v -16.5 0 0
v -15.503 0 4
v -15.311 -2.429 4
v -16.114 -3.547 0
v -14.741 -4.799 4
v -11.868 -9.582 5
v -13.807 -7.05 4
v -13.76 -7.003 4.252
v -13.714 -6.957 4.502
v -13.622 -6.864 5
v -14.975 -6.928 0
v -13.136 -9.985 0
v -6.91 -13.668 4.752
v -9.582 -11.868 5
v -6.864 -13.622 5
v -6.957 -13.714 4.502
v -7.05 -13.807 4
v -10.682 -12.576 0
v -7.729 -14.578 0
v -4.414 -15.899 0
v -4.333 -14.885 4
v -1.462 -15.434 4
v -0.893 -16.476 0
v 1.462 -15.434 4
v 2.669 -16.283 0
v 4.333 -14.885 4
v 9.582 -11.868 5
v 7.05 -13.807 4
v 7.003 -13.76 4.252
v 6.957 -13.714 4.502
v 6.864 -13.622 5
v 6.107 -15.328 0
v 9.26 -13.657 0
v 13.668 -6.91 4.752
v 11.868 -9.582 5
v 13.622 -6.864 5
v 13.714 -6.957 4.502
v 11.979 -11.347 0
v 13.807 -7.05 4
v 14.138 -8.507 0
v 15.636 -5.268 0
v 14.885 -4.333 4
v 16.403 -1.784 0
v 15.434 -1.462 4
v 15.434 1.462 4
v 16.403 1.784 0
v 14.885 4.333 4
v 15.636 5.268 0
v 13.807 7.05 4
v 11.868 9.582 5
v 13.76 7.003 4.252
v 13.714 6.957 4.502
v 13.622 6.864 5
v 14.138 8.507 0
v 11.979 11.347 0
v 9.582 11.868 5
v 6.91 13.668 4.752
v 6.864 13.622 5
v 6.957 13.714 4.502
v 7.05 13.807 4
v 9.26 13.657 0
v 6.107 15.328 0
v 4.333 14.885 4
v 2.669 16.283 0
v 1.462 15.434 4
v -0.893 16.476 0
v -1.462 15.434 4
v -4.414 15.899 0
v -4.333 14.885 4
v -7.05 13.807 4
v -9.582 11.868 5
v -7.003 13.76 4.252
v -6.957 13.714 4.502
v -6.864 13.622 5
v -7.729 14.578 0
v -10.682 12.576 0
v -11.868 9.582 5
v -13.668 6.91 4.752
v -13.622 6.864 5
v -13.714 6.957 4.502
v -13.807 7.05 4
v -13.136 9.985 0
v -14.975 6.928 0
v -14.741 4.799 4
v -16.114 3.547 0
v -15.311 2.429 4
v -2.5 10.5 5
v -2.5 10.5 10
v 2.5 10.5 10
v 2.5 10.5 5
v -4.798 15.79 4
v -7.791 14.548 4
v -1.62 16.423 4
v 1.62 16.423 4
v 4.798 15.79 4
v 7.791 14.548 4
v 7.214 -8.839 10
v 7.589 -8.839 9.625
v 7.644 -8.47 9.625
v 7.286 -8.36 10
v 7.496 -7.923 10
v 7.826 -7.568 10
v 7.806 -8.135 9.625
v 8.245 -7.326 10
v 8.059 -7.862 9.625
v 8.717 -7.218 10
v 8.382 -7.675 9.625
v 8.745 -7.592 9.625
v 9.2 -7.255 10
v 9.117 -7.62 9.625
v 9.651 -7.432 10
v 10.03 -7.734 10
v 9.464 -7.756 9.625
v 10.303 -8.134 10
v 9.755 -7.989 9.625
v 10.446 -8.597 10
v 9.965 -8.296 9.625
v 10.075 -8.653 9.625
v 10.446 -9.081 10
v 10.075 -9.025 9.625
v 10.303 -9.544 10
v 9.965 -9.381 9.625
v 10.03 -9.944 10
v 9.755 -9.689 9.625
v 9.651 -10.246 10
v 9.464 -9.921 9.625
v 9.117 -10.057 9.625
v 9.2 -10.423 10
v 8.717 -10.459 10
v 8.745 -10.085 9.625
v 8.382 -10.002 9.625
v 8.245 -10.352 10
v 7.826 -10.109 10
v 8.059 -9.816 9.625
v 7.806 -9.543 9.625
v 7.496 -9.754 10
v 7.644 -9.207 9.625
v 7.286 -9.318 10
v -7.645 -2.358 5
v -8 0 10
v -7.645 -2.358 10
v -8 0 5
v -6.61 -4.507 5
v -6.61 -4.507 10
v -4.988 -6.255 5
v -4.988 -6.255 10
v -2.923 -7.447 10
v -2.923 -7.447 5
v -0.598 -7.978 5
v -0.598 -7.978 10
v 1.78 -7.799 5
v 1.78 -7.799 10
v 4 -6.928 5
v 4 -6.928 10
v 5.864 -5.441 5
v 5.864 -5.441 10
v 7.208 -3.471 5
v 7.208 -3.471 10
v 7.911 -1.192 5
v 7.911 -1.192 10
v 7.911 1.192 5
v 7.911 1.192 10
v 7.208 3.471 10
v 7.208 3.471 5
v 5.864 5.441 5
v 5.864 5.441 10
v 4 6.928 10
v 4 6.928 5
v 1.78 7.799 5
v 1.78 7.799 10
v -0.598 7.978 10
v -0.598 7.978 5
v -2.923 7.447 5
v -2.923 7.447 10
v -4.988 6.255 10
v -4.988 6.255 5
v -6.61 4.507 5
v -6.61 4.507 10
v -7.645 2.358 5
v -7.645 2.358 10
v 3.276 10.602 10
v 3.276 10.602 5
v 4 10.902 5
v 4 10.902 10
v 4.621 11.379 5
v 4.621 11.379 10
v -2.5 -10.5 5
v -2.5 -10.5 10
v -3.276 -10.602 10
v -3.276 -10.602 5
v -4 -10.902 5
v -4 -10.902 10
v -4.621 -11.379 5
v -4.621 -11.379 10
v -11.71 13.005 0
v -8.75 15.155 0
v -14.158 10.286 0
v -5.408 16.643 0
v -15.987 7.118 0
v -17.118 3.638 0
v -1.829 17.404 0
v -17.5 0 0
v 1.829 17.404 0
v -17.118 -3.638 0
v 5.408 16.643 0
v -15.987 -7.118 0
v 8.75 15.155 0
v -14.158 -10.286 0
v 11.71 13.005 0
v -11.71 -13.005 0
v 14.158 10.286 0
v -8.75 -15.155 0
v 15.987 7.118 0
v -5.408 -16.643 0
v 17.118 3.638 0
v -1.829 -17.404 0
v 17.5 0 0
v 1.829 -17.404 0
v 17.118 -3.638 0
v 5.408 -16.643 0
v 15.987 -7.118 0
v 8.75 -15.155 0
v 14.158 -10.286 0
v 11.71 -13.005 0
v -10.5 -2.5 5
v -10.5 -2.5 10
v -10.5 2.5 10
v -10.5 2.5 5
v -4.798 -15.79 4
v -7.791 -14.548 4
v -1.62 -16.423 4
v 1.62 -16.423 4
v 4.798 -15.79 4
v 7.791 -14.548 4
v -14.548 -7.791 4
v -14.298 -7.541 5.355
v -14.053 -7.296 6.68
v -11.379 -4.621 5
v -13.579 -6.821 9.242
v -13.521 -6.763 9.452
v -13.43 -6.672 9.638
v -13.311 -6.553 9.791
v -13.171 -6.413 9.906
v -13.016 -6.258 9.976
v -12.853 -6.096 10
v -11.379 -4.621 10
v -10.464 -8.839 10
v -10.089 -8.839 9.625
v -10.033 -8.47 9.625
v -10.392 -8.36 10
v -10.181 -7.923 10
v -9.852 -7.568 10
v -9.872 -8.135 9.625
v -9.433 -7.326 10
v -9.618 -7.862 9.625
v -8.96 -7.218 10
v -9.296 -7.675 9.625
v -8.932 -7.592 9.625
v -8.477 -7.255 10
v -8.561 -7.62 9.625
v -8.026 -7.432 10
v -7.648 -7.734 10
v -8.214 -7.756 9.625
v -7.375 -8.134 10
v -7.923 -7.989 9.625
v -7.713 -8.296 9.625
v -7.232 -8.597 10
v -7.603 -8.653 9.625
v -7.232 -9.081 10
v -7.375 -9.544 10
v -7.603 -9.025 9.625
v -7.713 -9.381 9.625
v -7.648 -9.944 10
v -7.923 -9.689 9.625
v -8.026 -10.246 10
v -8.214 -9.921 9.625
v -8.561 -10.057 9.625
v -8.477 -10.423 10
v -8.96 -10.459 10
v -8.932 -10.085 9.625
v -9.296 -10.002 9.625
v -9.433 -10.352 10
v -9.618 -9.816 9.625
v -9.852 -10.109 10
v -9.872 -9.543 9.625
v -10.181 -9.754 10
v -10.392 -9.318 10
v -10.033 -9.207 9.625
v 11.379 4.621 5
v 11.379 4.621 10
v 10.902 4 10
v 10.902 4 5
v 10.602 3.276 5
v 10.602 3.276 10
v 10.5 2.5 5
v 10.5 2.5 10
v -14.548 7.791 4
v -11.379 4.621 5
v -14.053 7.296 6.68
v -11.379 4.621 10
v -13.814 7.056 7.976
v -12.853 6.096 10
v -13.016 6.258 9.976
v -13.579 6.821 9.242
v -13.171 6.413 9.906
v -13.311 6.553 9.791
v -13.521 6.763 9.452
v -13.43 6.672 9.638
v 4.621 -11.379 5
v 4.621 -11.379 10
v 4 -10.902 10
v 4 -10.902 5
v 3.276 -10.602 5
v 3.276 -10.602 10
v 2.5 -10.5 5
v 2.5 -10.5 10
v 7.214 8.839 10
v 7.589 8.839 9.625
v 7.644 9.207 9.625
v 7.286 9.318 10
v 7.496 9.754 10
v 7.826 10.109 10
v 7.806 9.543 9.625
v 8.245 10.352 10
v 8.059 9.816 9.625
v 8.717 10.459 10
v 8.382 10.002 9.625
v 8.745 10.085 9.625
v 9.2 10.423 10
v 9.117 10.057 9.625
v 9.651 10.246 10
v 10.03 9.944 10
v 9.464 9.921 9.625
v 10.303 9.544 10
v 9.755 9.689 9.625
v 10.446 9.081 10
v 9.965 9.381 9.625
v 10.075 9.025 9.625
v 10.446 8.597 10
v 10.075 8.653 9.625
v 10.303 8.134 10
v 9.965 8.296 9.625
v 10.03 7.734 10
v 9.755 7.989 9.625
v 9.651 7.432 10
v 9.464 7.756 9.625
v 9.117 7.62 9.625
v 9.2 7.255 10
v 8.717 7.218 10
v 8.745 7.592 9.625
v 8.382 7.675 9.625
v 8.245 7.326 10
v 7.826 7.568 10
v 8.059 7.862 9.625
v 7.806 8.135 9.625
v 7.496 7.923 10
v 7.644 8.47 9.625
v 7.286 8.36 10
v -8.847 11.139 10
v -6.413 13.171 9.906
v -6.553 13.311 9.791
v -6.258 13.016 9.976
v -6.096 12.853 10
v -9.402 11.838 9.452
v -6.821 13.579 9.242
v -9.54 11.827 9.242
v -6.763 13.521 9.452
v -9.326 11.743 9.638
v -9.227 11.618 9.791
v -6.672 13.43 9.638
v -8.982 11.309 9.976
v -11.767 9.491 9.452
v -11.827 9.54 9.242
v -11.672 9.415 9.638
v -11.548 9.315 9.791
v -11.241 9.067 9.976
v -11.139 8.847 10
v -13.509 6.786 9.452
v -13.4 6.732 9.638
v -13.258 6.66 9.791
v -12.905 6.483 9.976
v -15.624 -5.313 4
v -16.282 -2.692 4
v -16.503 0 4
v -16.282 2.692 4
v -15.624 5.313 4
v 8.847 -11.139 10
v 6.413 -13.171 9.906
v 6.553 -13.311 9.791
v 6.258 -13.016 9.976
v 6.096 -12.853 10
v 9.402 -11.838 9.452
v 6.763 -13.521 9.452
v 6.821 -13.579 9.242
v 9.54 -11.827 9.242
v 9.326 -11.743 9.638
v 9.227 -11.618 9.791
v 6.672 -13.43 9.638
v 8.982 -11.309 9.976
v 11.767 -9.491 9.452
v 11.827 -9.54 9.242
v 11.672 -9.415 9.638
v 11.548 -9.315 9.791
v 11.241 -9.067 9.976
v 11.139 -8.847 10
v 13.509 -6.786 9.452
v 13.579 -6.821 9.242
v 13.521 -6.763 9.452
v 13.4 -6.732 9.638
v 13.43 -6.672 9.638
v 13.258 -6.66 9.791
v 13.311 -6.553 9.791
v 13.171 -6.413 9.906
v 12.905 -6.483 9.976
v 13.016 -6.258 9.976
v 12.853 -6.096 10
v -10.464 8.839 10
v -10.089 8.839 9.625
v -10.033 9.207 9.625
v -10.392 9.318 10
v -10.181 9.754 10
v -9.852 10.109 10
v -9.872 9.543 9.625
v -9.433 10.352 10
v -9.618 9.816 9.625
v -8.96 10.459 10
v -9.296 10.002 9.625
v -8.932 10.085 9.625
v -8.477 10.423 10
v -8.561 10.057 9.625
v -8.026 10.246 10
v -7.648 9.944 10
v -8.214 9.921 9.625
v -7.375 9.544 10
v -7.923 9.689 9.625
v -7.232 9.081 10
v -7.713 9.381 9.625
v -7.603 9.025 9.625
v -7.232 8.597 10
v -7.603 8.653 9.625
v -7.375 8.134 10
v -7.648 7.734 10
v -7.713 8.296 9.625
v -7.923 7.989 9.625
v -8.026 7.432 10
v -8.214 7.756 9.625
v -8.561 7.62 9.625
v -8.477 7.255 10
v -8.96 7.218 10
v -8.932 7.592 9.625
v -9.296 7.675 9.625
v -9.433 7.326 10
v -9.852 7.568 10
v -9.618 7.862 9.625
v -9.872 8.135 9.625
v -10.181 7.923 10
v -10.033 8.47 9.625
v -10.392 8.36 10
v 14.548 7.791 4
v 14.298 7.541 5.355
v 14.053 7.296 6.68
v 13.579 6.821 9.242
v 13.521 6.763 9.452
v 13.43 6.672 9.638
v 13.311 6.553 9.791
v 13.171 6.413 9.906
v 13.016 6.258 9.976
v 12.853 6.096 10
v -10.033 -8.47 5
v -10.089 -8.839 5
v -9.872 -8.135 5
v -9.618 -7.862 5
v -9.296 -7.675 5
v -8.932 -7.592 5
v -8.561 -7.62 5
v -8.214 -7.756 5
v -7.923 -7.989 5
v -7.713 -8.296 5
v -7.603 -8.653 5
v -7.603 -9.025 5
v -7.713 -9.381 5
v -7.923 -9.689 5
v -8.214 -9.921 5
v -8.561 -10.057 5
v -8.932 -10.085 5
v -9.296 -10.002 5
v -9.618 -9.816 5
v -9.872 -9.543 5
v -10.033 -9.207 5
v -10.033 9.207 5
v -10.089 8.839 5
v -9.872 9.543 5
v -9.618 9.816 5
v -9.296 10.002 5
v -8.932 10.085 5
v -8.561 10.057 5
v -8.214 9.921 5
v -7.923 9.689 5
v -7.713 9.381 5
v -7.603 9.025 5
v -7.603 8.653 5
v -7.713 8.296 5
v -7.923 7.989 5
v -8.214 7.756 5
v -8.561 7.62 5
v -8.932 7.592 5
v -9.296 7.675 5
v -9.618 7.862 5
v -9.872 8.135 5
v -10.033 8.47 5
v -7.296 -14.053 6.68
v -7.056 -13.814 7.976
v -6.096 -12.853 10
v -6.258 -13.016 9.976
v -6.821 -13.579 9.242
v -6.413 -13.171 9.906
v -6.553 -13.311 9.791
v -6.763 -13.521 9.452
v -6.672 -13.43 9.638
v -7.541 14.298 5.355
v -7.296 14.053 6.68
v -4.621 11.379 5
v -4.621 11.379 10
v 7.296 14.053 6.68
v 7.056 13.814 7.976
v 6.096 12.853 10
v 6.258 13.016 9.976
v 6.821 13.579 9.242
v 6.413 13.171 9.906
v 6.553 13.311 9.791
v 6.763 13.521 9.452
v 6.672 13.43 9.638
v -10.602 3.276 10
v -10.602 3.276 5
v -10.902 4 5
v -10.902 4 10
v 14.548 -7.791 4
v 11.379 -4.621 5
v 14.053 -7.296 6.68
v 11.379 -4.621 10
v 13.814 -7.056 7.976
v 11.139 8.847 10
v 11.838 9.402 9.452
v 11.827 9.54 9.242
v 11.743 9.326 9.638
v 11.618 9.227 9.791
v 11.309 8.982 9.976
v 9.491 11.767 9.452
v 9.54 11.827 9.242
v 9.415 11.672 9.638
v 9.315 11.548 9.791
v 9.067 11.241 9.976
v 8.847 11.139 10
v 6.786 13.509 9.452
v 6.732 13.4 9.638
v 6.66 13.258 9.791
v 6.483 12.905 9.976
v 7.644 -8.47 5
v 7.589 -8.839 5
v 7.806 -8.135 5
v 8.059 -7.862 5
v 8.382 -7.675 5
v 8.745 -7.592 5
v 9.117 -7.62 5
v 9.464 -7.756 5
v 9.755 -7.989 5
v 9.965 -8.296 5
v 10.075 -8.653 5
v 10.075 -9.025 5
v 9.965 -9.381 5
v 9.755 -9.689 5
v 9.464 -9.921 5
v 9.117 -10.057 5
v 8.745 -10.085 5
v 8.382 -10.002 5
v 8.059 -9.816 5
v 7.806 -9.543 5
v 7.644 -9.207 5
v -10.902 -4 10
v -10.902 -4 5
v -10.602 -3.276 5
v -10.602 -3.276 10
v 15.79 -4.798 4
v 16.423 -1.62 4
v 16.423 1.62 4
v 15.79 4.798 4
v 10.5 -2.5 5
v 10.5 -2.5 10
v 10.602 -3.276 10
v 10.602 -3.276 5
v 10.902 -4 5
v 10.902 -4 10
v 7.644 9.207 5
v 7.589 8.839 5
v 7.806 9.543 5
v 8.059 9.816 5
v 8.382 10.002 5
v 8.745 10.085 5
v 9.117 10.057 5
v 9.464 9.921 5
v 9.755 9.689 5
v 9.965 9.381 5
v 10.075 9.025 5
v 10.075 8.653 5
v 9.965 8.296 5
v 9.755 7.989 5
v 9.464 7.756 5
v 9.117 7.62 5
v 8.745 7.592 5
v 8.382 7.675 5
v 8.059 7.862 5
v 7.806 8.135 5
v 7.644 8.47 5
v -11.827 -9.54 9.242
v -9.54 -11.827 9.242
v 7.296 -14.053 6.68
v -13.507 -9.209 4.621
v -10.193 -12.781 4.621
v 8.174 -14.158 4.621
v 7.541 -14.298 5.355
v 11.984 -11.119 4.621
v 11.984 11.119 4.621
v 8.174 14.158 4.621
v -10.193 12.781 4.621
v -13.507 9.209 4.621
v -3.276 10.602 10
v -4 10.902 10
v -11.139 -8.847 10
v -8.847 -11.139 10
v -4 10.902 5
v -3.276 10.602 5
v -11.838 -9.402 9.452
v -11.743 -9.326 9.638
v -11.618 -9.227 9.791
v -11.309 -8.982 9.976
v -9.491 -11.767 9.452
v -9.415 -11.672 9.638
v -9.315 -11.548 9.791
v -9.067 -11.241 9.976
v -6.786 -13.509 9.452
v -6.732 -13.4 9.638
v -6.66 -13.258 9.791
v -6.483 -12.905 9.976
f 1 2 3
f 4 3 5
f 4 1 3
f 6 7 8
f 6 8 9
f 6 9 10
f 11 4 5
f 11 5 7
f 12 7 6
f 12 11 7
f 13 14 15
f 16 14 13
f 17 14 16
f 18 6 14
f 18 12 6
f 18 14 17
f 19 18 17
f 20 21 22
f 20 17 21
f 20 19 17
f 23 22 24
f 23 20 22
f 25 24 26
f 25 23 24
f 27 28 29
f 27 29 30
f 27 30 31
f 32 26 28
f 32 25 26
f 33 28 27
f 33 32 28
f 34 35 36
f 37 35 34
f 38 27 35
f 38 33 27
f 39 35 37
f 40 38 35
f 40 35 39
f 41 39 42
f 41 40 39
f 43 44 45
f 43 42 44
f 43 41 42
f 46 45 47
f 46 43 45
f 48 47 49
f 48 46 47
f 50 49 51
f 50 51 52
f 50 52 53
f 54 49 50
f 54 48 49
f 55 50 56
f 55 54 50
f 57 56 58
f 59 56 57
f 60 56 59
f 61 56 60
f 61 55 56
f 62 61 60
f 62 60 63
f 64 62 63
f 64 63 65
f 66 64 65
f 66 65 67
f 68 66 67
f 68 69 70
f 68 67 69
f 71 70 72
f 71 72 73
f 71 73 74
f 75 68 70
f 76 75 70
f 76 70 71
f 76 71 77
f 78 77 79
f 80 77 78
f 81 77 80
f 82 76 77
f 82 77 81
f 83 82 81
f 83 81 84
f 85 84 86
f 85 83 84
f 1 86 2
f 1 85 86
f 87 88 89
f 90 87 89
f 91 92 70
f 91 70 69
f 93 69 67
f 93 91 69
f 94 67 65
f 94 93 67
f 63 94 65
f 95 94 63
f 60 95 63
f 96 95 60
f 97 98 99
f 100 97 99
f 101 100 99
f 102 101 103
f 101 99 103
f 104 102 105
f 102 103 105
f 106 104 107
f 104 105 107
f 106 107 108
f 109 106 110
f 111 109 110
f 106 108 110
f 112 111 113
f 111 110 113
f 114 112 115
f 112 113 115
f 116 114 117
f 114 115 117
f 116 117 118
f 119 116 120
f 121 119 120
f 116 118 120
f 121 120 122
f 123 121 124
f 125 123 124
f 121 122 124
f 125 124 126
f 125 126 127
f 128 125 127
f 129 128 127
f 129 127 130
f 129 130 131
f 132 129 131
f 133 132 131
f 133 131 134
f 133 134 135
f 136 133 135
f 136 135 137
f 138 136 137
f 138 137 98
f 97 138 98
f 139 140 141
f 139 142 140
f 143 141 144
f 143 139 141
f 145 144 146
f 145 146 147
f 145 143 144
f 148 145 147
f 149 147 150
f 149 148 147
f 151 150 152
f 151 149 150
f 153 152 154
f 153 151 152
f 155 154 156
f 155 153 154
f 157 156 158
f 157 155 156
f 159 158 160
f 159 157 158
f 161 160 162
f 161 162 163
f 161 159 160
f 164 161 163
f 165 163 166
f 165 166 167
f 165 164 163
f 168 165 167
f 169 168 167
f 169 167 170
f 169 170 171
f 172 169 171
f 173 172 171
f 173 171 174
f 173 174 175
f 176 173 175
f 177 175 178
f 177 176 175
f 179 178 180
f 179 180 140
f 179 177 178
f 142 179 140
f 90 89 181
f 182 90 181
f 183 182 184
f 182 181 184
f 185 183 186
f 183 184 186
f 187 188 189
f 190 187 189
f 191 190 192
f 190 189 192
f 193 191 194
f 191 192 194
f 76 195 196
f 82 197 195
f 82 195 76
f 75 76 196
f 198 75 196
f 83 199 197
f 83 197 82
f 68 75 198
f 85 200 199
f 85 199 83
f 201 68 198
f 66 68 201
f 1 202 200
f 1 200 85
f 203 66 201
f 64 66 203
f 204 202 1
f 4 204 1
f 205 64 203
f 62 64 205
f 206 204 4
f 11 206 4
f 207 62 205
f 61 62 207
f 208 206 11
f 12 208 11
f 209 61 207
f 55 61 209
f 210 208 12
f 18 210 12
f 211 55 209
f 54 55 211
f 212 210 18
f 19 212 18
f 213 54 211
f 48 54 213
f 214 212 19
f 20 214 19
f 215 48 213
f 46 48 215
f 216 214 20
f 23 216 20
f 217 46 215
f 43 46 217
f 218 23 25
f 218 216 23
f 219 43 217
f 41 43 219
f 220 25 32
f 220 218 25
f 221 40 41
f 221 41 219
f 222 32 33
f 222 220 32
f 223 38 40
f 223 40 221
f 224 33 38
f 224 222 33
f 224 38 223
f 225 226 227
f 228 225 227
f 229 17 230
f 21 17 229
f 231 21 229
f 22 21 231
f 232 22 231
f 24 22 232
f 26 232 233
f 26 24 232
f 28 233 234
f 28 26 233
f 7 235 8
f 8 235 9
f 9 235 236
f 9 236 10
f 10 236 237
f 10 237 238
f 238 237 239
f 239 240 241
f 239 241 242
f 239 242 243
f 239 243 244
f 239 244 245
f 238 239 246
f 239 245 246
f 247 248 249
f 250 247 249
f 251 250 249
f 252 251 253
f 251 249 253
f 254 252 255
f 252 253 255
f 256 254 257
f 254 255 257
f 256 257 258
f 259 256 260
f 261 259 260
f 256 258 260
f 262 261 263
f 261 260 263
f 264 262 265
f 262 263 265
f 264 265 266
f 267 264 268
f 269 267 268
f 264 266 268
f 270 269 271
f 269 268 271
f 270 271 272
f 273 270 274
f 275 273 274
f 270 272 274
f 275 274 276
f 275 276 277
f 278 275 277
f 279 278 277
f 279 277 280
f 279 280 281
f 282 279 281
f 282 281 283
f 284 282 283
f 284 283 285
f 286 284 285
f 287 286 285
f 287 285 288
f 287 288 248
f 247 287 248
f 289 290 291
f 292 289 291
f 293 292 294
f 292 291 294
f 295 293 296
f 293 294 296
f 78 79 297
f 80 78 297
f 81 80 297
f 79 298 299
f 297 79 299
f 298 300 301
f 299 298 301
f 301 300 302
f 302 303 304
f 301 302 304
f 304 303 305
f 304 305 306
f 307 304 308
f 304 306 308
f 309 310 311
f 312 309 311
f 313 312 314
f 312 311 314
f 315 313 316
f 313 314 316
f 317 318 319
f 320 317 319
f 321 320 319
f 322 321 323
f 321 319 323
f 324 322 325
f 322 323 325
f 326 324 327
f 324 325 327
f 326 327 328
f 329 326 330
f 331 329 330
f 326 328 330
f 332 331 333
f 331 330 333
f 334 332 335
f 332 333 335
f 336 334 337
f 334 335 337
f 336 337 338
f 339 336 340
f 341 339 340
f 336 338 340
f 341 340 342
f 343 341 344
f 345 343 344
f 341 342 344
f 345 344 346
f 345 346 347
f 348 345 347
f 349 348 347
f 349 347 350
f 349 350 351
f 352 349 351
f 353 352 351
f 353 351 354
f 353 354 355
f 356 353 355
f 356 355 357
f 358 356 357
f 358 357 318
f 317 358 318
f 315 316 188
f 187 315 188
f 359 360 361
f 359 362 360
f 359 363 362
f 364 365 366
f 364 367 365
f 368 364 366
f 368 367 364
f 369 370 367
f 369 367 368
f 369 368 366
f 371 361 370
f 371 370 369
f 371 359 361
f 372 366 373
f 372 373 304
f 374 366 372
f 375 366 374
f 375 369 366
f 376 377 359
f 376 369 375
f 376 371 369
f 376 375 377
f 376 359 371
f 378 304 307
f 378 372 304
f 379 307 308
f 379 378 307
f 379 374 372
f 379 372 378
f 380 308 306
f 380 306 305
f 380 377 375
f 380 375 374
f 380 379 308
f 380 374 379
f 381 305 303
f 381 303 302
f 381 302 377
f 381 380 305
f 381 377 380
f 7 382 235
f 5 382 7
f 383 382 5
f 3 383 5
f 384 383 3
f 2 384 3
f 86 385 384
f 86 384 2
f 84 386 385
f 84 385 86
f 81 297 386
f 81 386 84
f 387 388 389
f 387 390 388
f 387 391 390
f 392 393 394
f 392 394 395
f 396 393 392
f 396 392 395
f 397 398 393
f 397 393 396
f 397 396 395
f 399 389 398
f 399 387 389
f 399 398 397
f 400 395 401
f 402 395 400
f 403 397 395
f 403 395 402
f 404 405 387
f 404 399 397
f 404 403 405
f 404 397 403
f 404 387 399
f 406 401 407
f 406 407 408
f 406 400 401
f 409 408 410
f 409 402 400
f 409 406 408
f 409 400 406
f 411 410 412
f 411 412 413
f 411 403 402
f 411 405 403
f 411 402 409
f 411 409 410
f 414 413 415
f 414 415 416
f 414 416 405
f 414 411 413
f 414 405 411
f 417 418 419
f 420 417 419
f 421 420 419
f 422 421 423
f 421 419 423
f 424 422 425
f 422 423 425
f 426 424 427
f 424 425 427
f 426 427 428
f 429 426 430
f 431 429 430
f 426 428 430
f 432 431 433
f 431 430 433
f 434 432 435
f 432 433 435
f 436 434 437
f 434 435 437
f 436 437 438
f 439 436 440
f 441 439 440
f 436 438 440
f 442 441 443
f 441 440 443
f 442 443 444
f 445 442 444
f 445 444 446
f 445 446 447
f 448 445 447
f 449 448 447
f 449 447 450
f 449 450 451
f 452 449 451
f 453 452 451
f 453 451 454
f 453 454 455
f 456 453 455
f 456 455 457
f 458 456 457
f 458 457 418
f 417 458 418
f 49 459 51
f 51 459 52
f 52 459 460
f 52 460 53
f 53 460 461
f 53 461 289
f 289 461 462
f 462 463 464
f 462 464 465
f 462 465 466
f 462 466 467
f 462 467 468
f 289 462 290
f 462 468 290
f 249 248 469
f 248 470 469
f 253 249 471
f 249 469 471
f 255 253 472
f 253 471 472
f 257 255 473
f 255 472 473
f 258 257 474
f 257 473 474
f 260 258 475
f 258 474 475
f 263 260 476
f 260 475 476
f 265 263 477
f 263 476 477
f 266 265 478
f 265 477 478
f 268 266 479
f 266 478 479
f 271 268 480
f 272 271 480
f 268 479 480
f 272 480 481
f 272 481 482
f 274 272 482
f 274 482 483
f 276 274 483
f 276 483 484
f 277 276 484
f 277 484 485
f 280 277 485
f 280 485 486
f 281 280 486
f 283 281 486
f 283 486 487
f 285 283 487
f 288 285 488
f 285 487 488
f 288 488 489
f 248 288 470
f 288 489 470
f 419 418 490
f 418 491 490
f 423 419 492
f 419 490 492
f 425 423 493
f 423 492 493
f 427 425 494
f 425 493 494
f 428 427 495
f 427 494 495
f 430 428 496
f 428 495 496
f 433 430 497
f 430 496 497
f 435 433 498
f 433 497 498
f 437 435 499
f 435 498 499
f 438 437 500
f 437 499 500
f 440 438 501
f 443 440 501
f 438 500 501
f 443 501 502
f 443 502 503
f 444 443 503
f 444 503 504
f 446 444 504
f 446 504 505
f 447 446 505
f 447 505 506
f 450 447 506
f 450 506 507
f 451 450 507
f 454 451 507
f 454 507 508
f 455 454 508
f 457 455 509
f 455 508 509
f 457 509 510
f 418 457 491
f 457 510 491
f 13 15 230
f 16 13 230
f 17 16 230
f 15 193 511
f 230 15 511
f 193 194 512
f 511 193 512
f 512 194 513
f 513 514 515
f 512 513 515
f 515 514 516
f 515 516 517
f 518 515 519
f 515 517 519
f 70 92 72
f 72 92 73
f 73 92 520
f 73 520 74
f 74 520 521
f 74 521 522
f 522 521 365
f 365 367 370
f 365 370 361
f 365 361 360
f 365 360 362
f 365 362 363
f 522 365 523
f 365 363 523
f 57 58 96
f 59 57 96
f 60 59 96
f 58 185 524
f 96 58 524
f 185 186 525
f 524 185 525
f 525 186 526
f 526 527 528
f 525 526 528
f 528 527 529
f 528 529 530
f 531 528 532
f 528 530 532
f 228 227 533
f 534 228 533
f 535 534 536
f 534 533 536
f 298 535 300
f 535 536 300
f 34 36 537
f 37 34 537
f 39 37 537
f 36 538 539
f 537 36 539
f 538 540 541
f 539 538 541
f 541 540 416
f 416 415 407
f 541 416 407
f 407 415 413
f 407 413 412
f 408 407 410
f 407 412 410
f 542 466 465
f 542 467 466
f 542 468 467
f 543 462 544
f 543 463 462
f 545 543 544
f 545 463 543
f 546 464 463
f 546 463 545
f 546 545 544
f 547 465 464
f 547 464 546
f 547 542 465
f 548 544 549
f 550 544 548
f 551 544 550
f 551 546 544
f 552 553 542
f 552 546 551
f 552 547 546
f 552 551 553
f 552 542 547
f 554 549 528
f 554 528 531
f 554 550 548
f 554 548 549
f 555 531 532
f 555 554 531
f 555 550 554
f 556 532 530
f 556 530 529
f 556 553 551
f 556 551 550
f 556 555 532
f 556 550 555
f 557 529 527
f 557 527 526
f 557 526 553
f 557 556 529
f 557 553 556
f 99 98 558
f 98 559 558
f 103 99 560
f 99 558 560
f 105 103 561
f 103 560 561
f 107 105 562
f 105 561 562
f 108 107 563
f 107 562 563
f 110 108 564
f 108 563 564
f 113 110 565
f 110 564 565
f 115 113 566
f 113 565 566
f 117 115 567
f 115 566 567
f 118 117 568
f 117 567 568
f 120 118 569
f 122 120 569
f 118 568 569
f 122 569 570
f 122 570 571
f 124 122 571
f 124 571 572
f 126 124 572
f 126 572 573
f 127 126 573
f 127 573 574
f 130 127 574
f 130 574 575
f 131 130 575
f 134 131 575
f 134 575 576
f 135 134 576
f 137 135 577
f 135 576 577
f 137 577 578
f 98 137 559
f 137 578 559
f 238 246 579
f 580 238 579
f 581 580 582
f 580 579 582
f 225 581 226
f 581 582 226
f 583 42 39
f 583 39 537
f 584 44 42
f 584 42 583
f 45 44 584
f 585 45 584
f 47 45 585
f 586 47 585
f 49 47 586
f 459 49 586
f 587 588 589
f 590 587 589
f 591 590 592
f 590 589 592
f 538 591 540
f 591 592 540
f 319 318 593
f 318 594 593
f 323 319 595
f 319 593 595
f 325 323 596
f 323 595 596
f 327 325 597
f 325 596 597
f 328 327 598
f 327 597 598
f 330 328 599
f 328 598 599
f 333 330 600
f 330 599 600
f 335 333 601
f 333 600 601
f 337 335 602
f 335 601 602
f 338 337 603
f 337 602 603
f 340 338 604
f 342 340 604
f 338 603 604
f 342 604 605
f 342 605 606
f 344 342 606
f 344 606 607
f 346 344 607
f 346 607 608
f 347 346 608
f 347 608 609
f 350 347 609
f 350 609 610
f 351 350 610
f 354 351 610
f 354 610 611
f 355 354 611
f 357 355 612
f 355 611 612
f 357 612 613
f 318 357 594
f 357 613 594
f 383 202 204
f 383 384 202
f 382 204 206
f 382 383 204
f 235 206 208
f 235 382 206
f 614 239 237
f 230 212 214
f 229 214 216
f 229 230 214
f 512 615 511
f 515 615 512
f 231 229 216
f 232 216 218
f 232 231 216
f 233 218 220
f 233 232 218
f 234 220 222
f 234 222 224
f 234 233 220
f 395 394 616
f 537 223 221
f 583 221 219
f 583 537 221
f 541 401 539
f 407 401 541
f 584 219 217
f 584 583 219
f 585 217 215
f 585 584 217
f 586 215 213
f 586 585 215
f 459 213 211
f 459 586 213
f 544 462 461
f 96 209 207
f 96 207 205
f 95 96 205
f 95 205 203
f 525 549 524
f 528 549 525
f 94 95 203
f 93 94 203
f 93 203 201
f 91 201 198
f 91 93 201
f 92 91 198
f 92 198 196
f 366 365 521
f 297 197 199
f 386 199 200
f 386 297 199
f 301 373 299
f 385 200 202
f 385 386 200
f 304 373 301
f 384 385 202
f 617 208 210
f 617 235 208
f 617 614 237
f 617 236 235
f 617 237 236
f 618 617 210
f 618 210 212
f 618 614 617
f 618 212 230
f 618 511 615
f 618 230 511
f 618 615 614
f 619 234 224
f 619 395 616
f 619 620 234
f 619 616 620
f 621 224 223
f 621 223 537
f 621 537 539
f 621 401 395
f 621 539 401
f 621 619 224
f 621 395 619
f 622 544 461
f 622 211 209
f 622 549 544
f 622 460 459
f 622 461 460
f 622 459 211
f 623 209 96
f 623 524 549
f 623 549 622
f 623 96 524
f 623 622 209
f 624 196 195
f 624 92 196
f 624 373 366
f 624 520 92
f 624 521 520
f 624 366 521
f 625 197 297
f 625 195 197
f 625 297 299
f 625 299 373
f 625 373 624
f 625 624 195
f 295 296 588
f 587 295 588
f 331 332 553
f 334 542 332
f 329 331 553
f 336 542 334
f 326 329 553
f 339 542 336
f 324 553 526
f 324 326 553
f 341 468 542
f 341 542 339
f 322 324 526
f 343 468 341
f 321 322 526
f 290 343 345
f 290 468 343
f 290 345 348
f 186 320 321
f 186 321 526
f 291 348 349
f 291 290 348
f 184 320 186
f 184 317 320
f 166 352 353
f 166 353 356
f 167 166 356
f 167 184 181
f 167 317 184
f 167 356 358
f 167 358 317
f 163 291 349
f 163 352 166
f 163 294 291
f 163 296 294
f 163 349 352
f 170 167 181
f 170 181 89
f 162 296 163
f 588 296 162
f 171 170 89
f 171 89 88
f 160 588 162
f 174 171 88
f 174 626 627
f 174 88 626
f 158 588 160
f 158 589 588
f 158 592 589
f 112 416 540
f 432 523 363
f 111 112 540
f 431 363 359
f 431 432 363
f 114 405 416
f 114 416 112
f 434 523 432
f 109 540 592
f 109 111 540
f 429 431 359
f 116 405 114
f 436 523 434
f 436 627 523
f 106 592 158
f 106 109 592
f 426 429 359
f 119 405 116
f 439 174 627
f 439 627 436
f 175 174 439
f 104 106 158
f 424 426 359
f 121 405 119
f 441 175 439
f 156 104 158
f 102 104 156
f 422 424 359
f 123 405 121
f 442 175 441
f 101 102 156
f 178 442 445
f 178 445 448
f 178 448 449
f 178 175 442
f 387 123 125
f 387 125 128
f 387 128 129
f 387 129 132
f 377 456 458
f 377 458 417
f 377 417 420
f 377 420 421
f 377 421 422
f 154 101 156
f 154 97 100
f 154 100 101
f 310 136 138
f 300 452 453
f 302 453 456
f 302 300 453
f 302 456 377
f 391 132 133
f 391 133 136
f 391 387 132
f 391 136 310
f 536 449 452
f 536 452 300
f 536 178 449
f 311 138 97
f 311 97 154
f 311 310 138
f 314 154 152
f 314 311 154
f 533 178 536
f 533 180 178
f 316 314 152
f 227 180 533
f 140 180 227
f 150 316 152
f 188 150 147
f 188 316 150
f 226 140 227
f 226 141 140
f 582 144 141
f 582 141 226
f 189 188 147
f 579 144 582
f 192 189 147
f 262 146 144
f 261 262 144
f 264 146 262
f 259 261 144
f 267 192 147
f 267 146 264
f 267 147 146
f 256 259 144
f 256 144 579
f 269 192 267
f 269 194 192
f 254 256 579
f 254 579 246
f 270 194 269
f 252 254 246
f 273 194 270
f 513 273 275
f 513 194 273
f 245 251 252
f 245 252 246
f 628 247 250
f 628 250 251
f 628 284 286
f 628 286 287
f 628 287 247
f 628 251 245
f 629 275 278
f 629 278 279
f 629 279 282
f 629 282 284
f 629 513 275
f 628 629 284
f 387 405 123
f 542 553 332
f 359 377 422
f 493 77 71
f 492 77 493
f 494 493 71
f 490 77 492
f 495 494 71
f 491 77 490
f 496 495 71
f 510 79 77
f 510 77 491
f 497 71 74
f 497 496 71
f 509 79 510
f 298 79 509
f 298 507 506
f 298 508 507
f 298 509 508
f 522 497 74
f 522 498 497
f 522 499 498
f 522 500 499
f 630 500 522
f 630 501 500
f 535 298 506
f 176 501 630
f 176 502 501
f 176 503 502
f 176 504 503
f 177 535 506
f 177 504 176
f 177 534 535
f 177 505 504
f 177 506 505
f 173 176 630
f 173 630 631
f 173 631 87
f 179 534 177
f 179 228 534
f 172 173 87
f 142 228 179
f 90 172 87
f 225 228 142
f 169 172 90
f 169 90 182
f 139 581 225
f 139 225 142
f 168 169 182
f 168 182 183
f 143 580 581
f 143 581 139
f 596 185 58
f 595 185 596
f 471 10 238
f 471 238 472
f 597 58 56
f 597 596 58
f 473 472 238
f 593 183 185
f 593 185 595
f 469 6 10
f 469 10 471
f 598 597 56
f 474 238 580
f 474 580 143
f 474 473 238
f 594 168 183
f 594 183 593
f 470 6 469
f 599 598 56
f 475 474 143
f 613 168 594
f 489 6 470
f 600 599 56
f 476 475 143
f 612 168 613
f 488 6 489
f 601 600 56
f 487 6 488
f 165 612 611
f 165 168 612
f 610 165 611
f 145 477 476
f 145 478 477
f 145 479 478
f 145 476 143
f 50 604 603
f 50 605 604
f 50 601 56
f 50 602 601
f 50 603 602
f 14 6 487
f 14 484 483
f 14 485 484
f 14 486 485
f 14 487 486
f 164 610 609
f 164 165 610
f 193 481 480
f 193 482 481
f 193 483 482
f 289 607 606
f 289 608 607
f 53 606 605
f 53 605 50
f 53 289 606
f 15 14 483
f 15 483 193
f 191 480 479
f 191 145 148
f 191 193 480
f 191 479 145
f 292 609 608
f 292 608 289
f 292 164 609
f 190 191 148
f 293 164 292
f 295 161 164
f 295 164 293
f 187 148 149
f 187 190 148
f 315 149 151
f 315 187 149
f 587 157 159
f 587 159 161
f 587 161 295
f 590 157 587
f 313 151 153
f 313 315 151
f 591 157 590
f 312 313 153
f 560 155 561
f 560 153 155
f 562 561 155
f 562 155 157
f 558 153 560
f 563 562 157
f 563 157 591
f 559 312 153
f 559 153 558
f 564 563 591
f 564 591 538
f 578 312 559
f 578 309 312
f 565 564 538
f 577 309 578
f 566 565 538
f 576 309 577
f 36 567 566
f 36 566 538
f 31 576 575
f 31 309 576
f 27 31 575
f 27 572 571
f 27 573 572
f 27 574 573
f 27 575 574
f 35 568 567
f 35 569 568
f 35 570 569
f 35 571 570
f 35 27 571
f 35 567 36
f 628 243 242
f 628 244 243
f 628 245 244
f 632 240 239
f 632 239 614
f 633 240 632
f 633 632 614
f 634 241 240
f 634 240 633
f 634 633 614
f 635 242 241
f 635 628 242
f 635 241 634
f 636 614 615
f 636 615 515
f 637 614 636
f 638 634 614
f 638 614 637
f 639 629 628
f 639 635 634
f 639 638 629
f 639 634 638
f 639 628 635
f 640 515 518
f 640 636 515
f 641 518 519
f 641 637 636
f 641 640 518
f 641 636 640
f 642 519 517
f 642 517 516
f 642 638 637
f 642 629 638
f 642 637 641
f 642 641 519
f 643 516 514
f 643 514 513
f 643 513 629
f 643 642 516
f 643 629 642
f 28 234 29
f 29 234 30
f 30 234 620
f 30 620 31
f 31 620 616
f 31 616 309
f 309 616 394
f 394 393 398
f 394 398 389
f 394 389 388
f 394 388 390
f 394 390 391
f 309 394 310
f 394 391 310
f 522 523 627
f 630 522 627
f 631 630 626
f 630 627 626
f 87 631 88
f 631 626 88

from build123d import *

# Parameters (mm, degrees)
FILLET1_R                       = 1
M3X0_5_TAPPED_HOLE1_D           = 2.5
M3X0_5_TAPPED_HOLE1_CSINK_D     = 3.25
M3X0_5_TAPPED_HOLE1_CSINK_ANGLE = 90
CUT_EXTRUDE1_DEPTH              = 6


with BuildPart() as part:
    # Sketch4 → Revolve1 (revolve)
    with BuildSketch(Plane(origin=(0, 0, 0), x_dir=(0, 0, -1), z_dir=(1, 0, 0)), mode=Mode.PRIVATE) as revolve1_sk:
        Polygon((0, 16.5), (0, 17.5), (-10, 15.006719972), (-10, 8), (-5, 8), (-5, 15.253359986), align=None)
    revolve(revolve1_sk.sketch.rotate(Axis((0, 0, 0), (0, 0, 1)), 90), axis=Axis((0, 0, 0), (0, 0, 1)))

    # Fillet1
    fillet1_edges = [part.edges().sort_by_distance(p)[0] for p in [
        (15.006719972, 0, 10),
    ]]
    fillet(fillet1_edges, radius=FILLET1_R)

    # M3x0.5 Tapped Hole1 (through all)
    with Locations(Plane.XY.offset(10)):
        with Locations((8.838834765, 8.838834765), (-8.838834765, 8.838834765), (-8.838834765, -8.838834765), (8.838834765, -8.838834765)):
            CounterSinkHole(M3X0_5_TAPPED_HOLE1_D / 2, M3X0_5_TAPPED_HOLE1_CSINK_D / 2, counter_sink_angle=M3X0_5_TAPPED_HOLE1_CSINK_ANGLE)

    # Sketch9 → Cut-Extrude1 (cut)
    with BuildSketch(Plane.XY.offset(10)):
        with BuildLine():
            Line((-13.242640687, 20), (-4.621320344, 11.378679656))
            ThreePointArc((-4.621320344, 11.378679656), (-3.648050297, 10.728361402), (-2.5, 10.5))
            Line((-2.5, 10.5), (2.5, 10.5))
            ThreePointArc((2.5, 10.5), (3.648050297, 10.728361402), (4.621320344, 11.378679656))
            Line((4.621320344, 11.378679656), (13.242640687, 20))
            Line((13.242640687, 20), (-13.242640687, 20))
        make_face()
        with BuildLine():
            Line((20, 13.242640687), (11.378679656, 4.621320344))
            ThreePointArc((11.378679656, 4.621320344), (10.728361402, 3.648050297), (10.5, 2.5))
            Line((10.5, 2.5), (10.5, -2.5))
            ThreePointArc((10.5, -2.5), (10.728361402, -3.648050297), (11.378679656, -4.621320344))
            Line((11.378679656, -4.621320344), (20, -13.242640687))
            Line((20, -13.242640687), (20, 13.242640687))
        make_face()
        with BuildLine():
            Line((13.242640687, -20), (4.621320344, -11.378679656))
            ThreePointArc((4.621320344, -11.378679656), (3.648050297, -10.728361402), (2.5, -10.5))
            Line((2.5, -10.5), (-2.5, -10.5))
            ThreePointArc((-2.5, -10.5), (-3.648050297, -10.728361402), (-4.621320344, -11.378679656))
            Line((-4.621320344, -11.378679656), (-13.242640687, -20))
            Line((-13.242640687, -20), (13.242640687, -20))
        make_face()
        with BuildLine():
            Line((-20, -13.242640687), (-11.378679656, -4.621320344))
            ThreePointArc((-11.378679656, -4.621320344), (-10.728361402, -3.648050297), (-10.5, -2.5))
            Line((-10.5, -2.5), (-10.5, 2.5))
            ThreePointArc((-10.5, 2.5), (-10.728361402, 3.648050297), (-11.378679656, 4.621320344))
            Line((-11.378679656, 4.621320344), (-20, 13.242640687))
            Line((-20, 13.242640687), (-20, -13.242640687))
        make_face()
    extrude(amount=-CUT_EXTRUDE1_DEPTH, mode=Mode.SUBTRACT)


solid = part.part
